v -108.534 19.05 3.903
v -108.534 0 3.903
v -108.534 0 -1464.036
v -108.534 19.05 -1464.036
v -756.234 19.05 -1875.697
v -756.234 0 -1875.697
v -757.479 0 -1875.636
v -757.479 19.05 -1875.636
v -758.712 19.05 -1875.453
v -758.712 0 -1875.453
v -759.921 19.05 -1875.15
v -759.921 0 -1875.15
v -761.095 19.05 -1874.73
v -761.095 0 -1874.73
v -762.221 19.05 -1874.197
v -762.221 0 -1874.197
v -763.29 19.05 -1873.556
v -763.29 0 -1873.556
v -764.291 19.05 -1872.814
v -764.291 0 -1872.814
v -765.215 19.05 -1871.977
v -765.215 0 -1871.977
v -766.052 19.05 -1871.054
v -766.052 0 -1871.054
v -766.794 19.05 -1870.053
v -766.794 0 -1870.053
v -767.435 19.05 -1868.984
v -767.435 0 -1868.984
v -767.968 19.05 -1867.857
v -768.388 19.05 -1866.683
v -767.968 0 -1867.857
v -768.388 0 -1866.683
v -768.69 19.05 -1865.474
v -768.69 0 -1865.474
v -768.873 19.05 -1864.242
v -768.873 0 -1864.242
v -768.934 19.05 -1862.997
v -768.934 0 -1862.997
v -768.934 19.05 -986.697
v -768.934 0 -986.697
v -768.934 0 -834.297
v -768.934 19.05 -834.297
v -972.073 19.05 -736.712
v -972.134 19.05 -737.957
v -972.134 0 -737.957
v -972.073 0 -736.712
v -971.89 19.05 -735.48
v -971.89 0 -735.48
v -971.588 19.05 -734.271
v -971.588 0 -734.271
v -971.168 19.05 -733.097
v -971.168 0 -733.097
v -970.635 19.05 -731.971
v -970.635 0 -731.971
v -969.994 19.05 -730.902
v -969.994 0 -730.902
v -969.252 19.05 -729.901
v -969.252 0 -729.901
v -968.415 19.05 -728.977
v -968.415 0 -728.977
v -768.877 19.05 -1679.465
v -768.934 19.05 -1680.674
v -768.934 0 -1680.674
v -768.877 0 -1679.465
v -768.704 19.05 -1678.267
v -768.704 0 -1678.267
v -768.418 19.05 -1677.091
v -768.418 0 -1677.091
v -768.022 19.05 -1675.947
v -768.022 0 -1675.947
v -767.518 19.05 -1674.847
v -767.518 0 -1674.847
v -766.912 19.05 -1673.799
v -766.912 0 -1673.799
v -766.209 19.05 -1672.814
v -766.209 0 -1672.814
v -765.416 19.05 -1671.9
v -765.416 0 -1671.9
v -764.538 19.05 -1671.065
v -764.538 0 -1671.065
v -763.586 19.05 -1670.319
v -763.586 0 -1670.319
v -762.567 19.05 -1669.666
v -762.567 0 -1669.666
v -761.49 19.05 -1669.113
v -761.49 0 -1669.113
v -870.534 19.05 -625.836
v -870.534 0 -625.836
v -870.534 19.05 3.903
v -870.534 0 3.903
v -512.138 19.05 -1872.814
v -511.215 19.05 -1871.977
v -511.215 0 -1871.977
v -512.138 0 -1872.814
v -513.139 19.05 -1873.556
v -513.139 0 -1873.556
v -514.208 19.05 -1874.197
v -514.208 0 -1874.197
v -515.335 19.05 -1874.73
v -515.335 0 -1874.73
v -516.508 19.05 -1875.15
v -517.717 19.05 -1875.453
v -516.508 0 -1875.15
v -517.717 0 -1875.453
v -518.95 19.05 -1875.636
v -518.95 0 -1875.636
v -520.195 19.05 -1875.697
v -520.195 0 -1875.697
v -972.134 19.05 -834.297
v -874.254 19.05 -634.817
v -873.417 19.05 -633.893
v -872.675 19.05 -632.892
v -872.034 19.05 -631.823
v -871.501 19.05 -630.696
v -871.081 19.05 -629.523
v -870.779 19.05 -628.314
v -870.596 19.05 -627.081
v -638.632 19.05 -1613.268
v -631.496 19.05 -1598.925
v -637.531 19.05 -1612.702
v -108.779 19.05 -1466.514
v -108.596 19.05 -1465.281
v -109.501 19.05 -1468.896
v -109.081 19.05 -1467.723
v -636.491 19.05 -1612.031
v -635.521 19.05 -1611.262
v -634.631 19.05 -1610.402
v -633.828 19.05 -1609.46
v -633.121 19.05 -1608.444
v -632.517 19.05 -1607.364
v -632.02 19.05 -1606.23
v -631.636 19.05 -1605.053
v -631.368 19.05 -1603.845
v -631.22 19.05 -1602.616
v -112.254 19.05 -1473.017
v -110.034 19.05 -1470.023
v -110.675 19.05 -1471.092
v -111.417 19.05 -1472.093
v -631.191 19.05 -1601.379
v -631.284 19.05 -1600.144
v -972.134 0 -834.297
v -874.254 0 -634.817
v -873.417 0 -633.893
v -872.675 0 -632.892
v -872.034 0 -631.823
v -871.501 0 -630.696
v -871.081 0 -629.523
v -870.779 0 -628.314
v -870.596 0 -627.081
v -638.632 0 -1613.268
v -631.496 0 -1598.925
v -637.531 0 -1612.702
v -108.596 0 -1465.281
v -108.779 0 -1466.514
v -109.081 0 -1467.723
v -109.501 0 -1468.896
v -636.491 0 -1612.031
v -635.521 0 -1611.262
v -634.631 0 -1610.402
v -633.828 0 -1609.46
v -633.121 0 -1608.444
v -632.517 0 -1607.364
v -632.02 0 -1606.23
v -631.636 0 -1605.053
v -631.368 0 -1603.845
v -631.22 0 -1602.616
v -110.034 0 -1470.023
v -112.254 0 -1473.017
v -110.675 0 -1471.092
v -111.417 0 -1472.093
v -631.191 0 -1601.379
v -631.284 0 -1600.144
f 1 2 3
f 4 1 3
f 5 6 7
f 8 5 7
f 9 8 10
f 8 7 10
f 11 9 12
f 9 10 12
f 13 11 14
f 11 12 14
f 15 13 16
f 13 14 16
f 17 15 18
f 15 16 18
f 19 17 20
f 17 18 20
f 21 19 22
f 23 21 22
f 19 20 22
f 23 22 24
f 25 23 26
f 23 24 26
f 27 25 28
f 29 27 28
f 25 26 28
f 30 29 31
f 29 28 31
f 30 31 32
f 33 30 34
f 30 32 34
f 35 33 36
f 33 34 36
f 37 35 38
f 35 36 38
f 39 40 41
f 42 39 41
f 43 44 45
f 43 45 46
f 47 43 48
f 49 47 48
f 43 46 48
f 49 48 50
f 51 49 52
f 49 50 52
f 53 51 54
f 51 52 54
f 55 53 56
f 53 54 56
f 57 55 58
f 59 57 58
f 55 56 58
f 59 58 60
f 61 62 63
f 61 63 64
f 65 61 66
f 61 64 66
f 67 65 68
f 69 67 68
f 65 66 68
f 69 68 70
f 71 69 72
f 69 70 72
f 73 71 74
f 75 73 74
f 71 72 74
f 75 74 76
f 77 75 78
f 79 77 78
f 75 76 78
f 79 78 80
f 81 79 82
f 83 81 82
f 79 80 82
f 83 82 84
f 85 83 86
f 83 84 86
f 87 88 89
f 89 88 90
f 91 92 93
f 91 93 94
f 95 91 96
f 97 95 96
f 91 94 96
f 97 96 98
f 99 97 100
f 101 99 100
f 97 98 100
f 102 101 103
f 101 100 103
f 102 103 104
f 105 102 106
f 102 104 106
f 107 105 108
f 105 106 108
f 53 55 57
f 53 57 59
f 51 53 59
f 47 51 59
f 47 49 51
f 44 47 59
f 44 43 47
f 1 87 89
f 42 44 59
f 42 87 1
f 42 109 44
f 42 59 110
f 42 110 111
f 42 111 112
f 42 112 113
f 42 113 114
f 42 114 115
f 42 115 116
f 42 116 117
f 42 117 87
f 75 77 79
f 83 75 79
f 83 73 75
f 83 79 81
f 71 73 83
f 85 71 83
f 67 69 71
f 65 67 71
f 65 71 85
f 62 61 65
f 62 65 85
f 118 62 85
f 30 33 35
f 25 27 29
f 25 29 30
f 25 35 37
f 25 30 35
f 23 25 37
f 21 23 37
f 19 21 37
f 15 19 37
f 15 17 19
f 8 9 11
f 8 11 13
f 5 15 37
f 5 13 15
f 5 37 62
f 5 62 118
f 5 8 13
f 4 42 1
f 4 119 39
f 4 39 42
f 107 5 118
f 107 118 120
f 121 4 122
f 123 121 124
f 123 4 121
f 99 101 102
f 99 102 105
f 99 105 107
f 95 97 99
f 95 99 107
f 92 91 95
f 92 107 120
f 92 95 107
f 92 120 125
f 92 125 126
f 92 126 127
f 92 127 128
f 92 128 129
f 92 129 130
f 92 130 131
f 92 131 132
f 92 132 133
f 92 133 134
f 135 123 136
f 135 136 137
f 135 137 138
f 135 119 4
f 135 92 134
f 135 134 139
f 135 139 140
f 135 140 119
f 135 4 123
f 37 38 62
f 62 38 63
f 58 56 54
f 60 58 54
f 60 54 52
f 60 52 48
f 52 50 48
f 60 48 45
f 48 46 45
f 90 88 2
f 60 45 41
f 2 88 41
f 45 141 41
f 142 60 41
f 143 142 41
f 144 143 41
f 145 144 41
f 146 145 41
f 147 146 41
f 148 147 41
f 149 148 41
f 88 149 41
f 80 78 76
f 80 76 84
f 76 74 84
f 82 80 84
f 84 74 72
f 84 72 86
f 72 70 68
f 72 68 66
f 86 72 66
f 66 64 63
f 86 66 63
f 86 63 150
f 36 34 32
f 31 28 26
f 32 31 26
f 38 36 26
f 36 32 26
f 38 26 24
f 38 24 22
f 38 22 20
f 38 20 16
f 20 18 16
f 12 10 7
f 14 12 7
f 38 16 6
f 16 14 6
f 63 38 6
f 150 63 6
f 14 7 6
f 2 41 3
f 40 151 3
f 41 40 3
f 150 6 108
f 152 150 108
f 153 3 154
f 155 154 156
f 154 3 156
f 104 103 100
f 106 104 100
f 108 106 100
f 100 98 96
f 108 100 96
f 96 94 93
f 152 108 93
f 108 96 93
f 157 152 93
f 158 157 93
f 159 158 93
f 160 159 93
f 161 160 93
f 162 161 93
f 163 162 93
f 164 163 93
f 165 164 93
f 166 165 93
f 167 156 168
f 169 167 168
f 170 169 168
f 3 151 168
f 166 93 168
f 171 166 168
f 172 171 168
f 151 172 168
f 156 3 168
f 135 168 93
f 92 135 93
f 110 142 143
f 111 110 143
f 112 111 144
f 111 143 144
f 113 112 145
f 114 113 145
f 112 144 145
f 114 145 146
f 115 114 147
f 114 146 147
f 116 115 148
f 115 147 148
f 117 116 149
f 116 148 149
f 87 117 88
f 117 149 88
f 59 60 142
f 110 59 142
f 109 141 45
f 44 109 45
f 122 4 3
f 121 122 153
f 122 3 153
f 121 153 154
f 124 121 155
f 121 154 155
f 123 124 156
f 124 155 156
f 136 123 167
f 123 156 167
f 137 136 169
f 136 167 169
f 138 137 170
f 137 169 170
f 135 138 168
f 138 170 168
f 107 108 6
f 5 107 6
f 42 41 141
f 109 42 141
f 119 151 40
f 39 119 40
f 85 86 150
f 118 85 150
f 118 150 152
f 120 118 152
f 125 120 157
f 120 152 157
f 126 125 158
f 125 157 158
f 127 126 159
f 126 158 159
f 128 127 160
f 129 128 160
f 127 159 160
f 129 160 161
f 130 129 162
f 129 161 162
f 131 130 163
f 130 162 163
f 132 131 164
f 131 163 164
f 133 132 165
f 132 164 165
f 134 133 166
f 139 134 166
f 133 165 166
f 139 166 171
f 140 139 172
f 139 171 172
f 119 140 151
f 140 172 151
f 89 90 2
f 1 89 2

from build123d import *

# Parameters (mm, degrees)
BOSS_EXTRUDE1_DEPTH = 19.05


with BuildPart() as part:
    # Sketch1 → Boss-Extrude1 (new body)
    with BuildSketch(Plane(origin=(0, 0, 0), x_dir=(1, 0, 0), z_dir=(0, 1, 0))):
        with BuildLine():
            Line((-108.53449825, -3.903212814), (-108.53449825, 1464.036274944))
            ThreePointArc((-108.53449825, 1464.036274944), (-109.501228187, 1468.896354535), (-112.254242128, 1473.016531065))
            Line((-112.254242128, 1473.016531065), (-511.214754371, 1871.977043307))
            ThreePointArc((-511.214754371, 1871.977043307), (-515.334930901, 1874.730057249), (-520.195010492, 1875.696787186))
            Line((-520.195010492, 1875.696787186), (-756.23449825, 1875.696787186))
            ThreePointArc((-756.23449825, 1875.696787186), (-765.214754371, 1871.977043307), (-768.93449825, 1862.996787186))
            Line((-768.93449825, 1862.996787186), (-768.93449825, 1680.674485719))
            ThreePointArc((-768.93449825, 1680.674485719), (-766.912332227, 1673.798886723), (-761.489795642, 1669.112831455))
            Line((-761.489795642, 1669.112831455), (-638.63184093, 1613.268306586))
            ThreePointArc((-638.63184093, 1613.268306586), (-632.516703345, 1607.363790151), (-631.495541921, 1598.924865375))
            Line((-631.495541921, 1598.924865375), (-768.93449825, 986.696787186))
            Line((-768.93449825, 986.696787186), (-768.93449825, 834.296787186))
            Line((-768.93449825, 834.296787186), (-972.13449825, 834.296787186))
            Line((-972.13449825, 834.296787186), (-972.13449825, 737.957299428))
            ThreePointArc((-972.13449825, 737.957299428), (-971.167768312, 733.097219837), (-968.414754371, 728.977043307))
            Line((-968.414754371, 728.977043307), (-874.254242128, 634.816531065))
            ThreePointArc((-874.254242128, 634.816531065), (-871.501228187, 630.696354535), (-870.53449825, 625.836274944))
            Line((-870.53449825, 625.836274944), (-870.53449825, -3.903212814))
            Line((-870.53449825, -3.903212814), (-108.53449825, -3.903212814))
        make_face()
    extrude(amount=BOSS_EXTRUDE1_DEPTH)


solid = part.part
